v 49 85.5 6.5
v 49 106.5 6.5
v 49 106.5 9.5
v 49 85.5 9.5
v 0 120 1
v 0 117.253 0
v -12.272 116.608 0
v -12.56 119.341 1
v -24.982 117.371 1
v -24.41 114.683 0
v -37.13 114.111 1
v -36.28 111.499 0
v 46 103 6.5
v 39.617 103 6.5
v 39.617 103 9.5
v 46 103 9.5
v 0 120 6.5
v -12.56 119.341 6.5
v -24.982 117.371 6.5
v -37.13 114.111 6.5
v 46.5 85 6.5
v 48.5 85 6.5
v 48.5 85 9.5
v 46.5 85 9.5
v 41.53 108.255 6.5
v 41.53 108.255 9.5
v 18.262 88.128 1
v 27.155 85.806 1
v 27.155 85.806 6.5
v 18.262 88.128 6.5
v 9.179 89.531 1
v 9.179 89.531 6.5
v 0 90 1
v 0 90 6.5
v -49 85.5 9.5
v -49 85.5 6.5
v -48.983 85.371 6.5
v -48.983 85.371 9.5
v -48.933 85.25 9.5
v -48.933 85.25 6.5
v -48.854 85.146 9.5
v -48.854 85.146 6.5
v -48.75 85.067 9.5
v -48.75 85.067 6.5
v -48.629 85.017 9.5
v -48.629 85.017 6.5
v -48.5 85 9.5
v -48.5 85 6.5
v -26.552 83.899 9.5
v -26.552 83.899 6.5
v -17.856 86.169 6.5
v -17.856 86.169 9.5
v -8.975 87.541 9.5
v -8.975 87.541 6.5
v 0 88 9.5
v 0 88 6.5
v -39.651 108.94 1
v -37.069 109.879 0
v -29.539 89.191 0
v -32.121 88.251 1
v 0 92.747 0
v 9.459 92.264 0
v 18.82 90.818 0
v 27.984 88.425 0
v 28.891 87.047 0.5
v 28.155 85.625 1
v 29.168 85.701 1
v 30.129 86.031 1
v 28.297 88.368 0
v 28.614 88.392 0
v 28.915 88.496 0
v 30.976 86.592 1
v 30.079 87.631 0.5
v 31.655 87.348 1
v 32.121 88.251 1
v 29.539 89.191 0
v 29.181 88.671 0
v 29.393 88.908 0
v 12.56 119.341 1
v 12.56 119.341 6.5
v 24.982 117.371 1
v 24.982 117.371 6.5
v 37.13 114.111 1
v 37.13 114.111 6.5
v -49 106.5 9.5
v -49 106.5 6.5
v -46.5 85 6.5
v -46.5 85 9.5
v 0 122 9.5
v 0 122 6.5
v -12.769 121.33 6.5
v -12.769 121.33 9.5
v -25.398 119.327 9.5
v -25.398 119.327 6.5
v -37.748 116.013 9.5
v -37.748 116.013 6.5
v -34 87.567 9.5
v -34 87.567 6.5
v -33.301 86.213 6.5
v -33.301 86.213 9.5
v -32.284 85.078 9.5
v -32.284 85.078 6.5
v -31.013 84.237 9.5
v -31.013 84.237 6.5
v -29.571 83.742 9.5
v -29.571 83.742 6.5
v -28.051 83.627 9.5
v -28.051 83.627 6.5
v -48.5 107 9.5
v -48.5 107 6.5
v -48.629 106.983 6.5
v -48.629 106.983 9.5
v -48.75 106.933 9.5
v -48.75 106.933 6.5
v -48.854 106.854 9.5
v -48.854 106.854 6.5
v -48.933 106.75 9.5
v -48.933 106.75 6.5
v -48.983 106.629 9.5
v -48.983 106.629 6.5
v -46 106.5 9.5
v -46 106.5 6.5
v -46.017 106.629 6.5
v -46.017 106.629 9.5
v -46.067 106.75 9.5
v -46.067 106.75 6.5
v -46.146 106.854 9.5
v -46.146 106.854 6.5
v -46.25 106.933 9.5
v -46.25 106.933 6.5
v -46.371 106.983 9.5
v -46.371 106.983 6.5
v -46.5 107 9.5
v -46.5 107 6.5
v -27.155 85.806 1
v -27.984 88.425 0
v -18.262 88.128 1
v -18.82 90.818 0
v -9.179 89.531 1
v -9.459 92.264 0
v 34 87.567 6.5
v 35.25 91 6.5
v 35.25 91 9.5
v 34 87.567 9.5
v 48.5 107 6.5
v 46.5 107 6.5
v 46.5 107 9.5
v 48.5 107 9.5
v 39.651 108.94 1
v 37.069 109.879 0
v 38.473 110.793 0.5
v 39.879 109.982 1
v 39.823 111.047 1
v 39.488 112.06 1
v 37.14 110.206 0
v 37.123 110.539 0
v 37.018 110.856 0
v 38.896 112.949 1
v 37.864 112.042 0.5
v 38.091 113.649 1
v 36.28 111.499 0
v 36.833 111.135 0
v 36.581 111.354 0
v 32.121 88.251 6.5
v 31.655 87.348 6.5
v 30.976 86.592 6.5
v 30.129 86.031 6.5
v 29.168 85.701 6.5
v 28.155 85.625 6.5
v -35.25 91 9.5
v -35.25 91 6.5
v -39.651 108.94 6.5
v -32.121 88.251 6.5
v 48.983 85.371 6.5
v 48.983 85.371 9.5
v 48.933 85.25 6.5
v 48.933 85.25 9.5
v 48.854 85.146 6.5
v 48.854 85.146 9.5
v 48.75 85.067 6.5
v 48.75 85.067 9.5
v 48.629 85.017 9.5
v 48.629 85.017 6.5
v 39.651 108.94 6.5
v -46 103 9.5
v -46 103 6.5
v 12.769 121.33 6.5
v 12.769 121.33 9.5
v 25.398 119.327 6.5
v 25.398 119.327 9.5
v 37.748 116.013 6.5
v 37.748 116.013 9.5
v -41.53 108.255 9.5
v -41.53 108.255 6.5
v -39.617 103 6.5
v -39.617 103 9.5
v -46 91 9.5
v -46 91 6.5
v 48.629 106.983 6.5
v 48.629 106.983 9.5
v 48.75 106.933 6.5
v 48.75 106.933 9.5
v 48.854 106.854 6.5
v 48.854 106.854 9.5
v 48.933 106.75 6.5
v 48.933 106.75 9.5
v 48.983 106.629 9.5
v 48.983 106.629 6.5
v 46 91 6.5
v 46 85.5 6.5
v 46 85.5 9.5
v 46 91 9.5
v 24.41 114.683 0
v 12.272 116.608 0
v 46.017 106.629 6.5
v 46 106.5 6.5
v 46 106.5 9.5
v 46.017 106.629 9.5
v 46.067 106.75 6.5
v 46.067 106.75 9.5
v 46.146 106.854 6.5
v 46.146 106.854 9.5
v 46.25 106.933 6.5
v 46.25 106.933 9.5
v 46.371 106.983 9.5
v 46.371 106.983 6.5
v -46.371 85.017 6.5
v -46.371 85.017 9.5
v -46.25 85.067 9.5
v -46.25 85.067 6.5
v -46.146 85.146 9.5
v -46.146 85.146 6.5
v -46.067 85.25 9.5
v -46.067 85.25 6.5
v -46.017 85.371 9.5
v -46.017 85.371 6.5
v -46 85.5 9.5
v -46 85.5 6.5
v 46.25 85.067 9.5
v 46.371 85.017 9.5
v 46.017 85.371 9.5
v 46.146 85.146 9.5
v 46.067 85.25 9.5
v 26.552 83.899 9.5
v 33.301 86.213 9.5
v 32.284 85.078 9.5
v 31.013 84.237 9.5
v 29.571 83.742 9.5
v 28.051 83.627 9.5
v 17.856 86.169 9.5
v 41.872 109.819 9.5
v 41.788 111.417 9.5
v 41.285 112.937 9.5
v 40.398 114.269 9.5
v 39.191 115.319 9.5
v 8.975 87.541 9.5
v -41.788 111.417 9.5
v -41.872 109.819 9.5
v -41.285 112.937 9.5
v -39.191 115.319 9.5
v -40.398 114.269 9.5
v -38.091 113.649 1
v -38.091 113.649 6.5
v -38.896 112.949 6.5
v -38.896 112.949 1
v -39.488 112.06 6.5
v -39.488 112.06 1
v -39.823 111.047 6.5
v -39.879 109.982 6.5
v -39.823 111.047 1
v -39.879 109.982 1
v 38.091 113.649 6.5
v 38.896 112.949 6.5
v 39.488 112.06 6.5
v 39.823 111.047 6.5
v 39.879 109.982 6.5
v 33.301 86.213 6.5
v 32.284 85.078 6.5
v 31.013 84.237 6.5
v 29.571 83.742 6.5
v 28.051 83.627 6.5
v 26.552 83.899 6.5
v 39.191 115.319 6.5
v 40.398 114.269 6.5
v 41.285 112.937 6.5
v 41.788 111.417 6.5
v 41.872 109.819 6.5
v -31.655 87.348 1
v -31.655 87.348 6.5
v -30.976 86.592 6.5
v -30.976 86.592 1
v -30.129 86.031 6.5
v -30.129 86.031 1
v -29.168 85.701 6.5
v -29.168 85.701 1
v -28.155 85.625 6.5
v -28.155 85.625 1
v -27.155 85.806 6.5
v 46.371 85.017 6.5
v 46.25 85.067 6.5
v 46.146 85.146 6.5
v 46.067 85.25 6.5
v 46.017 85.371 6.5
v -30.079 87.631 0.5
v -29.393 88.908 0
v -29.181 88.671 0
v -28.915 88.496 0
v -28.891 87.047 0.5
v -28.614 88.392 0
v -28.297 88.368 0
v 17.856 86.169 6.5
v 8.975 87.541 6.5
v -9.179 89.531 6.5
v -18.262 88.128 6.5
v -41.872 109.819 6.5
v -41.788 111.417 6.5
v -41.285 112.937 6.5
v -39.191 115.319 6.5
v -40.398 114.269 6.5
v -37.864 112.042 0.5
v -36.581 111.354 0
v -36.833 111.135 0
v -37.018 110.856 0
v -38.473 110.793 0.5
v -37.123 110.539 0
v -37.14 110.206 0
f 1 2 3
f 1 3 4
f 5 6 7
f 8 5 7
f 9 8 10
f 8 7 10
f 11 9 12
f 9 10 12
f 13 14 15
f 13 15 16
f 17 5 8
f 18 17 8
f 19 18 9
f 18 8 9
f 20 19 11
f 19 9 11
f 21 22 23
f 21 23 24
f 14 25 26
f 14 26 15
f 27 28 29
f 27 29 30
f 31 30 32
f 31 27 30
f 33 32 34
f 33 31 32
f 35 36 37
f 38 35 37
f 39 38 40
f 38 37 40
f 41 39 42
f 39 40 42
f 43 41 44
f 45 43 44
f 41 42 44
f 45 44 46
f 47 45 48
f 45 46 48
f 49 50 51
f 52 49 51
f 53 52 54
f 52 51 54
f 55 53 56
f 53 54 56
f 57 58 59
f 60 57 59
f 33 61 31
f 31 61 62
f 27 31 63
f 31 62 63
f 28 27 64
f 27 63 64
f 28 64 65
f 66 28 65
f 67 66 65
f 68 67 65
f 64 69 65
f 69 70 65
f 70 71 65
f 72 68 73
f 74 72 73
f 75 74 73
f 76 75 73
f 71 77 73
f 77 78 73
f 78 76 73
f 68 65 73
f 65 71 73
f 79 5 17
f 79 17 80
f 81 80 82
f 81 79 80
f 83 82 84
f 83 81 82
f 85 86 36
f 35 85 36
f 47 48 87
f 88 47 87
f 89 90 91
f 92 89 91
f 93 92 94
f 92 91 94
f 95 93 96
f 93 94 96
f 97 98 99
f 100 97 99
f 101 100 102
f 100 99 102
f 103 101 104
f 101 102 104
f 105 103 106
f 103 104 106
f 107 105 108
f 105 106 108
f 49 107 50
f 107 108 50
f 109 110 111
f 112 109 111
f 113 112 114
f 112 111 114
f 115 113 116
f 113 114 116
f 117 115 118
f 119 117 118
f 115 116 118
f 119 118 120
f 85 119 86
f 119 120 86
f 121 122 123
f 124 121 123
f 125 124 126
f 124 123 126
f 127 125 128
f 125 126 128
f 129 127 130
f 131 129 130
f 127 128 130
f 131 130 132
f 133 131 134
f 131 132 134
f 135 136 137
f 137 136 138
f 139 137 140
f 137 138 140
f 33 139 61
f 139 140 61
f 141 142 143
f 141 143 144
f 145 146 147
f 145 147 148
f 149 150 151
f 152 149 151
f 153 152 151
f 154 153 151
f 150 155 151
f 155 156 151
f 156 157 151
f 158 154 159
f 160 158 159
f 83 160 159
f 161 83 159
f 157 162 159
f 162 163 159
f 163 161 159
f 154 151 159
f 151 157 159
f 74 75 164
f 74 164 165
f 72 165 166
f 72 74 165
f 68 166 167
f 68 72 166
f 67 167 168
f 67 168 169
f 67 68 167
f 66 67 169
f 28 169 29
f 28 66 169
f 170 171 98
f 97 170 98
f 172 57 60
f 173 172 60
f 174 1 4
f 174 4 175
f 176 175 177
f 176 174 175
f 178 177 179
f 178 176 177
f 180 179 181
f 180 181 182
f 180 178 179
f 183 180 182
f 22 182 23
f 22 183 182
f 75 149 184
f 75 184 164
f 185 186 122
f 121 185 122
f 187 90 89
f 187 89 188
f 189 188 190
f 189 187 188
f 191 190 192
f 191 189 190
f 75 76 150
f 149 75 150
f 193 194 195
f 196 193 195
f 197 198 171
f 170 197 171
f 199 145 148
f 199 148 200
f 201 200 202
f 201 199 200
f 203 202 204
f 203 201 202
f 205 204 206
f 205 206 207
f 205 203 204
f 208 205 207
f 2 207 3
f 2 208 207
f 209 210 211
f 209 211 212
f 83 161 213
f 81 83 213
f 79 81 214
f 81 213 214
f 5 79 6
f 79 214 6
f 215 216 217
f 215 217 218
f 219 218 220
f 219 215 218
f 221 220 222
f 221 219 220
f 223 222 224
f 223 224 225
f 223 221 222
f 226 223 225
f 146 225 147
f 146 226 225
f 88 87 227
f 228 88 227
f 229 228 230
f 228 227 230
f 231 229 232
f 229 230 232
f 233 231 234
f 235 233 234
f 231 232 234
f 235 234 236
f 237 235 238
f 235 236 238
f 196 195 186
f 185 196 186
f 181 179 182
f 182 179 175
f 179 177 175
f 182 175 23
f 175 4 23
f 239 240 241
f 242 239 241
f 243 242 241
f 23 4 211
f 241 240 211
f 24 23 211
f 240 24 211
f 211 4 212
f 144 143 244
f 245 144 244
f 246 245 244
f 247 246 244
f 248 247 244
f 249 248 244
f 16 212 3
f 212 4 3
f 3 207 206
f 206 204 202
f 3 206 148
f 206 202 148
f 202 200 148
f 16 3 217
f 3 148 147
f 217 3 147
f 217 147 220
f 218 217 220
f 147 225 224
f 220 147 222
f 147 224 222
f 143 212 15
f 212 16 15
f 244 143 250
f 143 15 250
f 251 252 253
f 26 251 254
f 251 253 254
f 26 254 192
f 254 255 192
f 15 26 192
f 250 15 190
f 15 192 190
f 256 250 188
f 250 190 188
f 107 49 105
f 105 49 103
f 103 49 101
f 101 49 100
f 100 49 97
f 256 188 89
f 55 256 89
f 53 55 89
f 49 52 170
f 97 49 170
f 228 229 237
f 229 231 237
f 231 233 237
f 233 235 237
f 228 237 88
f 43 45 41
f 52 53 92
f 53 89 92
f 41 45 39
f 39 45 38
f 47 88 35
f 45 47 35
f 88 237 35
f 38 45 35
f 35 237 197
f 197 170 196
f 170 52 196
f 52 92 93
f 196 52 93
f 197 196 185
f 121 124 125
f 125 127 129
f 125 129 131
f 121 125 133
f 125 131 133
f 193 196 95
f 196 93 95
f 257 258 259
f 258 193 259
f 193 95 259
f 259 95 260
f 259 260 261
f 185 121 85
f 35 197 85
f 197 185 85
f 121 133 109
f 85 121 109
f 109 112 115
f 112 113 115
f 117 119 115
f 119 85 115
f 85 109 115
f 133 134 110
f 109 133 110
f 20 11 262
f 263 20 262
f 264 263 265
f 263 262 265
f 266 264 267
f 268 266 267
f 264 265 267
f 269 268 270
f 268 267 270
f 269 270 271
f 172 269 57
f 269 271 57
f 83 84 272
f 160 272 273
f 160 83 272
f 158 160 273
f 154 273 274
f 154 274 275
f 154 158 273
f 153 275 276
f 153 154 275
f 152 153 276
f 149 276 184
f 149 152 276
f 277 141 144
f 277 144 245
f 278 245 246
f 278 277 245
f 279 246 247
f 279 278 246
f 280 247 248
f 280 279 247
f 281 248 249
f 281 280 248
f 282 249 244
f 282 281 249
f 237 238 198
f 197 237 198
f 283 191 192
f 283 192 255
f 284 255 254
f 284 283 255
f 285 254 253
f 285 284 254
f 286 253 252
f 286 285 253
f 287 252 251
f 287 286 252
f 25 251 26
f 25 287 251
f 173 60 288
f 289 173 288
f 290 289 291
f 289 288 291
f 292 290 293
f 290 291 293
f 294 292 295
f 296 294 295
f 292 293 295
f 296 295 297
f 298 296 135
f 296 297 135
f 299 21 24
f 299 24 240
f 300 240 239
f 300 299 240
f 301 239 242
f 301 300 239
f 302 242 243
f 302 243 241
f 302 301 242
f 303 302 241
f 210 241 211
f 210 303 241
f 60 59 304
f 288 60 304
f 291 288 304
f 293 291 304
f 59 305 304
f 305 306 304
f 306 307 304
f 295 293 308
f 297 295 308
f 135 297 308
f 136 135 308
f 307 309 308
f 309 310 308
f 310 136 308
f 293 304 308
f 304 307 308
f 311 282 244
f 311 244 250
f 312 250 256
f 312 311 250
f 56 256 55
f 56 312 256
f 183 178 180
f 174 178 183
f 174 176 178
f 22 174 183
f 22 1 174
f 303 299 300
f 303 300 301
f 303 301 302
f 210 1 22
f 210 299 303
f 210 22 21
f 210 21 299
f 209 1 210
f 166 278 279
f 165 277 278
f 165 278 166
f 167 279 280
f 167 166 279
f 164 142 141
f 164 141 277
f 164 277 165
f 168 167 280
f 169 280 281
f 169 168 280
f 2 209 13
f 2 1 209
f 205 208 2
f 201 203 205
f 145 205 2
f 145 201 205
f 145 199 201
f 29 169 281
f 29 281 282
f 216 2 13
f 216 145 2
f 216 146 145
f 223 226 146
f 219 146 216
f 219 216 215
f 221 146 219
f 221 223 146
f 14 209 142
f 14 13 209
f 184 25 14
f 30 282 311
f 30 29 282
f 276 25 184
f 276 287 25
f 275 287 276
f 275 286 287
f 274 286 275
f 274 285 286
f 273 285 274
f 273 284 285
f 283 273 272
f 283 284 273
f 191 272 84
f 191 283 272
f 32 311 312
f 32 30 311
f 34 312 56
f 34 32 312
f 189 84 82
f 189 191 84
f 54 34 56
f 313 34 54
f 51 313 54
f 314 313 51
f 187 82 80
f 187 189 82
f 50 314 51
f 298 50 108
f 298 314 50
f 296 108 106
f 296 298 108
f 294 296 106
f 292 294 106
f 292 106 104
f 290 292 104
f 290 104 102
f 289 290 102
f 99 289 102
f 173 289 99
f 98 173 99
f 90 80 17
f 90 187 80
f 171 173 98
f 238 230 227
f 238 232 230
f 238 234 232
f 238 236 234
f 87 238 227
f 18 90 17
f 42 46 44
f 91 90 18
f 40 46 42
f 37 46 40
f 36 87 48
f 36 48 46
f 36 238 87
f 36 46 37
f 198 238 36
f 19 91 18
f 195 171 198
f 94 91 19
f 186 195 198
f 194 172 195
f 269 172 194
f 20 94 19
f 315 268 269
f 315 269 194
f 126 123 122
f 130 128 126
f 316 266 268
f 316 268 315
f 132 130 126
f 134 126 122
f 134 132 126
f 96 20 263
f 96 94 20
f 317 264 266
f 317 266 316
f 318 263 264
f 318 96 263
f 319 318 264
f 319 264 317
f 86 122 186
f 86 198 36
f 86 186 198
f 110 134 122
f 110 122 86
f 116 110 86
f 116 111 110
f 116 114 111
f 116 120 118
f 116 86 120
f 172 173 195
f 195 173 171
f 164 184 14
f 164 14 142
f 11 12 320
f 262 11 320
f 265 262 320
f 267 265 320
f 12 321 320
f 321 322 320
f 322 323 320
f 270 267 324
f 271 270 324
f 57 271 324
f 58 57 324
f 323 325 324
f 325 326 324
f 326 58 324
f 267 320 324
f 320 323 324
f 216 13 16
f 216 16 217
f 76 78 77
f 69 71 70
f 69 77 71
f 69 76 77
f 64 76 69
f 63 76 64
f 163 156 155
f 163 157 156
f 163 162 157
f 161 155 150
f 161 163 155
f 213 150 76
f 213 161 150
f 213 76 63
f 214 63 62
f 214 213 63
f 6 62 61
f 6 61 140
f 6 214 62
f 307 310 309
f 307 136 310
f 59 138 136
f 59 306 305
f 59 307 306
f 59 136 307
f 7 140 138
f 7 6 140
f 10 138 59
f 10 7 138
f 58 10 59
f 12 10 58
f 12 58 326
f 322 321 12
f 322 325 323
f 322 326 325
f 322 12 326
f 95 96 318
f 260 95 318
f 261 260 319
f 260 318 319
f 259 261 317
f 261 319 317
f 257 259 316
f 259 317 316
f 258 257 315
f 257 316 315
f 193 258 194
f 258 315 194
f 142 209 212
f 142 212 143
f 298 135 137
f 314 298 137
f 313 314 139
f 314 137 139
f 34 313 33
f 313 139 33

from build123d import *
from OCP.BRepFilletAPI import BRepFilletAPI_MakeChamfer

# Parameters (mm, degrees)
DODANIE_WYCI_GNI_CIE1_DEPTH = 6.5
DODANIE_WYCI_GNI_CIE2_DEPTH = 3
SFAZOWANIE1_SIZE            = 1
SFAZOWANIE1_SIZE2           = 2.747477419


with BuildPart() as part:
    # Szkic2 → Dodanie-wyciągnięcie1 (new body)
    with BuildSketch(Plane.XY):
        with BuildLine():
            Line((-39.650742014, 108.939518347), (-32.120772186, 88.251096277))
            ThreePointArc((-32.120772186, 88.251096277), (-30.12924195, 86.030742386), (-27.155108014, 85.805594857))
            ThreePointArc((-27.155108014, 85.805594857), (-13.738567299, 88.945217795), (0, 90))
            Line((0, 90), (0, 120))
            ThreePointArc((0, 120), (-18.796846712, 118.518684408), (-37.129625721, 114.111309228))
            ThreePointArc((-37.129625721, 114.111309228), (-39.48751323, 112.060333895), (-39.650742014, 108.939518347))
        make_face()
    dodanie_wyci_gni_cie1 = extrude(amount=DODANIE_WYCI_GNI_CIE1_DEPTH)

    # Szkic3 → Dodanie-wyciągnięcie2 (add)
    with BuildSketch(Plane.XY.offset(6.5)):
        with BuildLine():
            Line((-46, 91), (-35.249646863, 91))
            Line((-35.249646863, 91), (-34.000157428, 87.567055991))
            ThreePointArc((-34.000157428, 87.567055991), (-31.012862074, 84.236525153), (-26.551661169, 83.89880386))
            ThreePointArc((-26.551661169, 83.89880386), (-13.433265804, 86.968657399), (0, 88))
            Line((0, 88), (0, 90))
            ThreePointArc((0, 90), (-13.738567299, 88.945217795), (-27.155108014, 85.805594857))
            ThreePointArc((-27.155108014, 85.805594857), (-30.12924195, 86.030742386), (-32.120772186, 88.251096277))
            Line((-32.120772186, 88.251096277), (-39.650742014, 108.939518347))
            ThreePointArc((-39.650742014, 108.939518347), (-39.48751323, 112.060333895), (-37.129625721, 114.111309228))
            ThreePointArc((-37.129625721, 114.111309228), (-18.796846712, 118.518684408), (0, 120))
            Line((0, 120), (0, 122))
            ThreePointArc((0, 122), (-19.11012749, 120.493995814), (-37.748452817, 116.013164382))
            ThreePointArc((-37.748452817, 116.013164382), (-41.285284079, 112.936701382), (-41.530127255, 108.255478061))
            Line((-41.530127255, 108.255478061), (-39.617289674, 103))
            Line((-39.617289674, 103), (-46, 103))
            Line((-46, 103), (-46, 106.5))
            ThreePointArc((-46, 106.5), (-46.146446609, 106.853553391), (-46.5, 107))
            Line((-46.5, 107), (-48.5, 107))
            ThreePointArc((-48.5, 107), (-48.853553391, 106.853553391), (-49, 106.5))
            Line((-49, 106.5), (-49, 103))
            Line((-49, 103), (-49, 85.5))
            ThreePointArc((-49, 85.5), (-48.853553391, 85.146446609), (-48.5, 85))
            Line((-48.5, 85), (-46.5, 85))
            ThreePointArc((-46.5, 85), (-46.146446609, 85.146446609), (-46, 85.5))
            Line((-46, 85.5), (-46, 91))
        make_face()
        with BuildLine():
            ThreePointArc((-27.155108014, 85.805594857), (-13.738567299, 88.945217795), (0, 90))
            Line((0, 90), (0, 120))
            ThreePointArc((0, 120), (-18.796846712, 118.518684408), (-37.129625721, 114.111309228))
            ThreePointArc((-37.129625721, 114.111309228), (-39.48751323, 112.060333895), (-39.650742014, 108.939518347))
            Line((-39.650742014, 108.939518347), (-32.120772186, 88.251096277))
            ThreePointArc((-32.120772186, 88.251096277), (-30.12924195, 86.030742386), (-27.155108014, 85.805594857))
        make_face()
    dodanie_wyci_gni_cie2 = extrude(amount=DODANIE_WYCI_GNI_CIE2_DEPTH)

    # Lustro1: Dodanie-wyciągnięcie1, Dodanie-wyciągnięcie2 across plane
    add(dodanie_wyci_gni_cie1.mirror(Plane(origin=(0, 0, 0), x_dir=(0, 0, 1), z_dir=(1, 0, 0))))
    add(dodanie_wyci_gni_cie2.mirror(Plane(origin=(0, 0, 0), x_dir=(0, 0, 1), z_dir=(1, 0, 0))))

    # Sfazowanie1: one chamfer whose edges measure the first distance from different faces: ONE call of the kernel's chamfer builder (chamfer() names one face for all edges)
    sfazowanie1_edges_1 = [part.edges().sort_by_distance(p)[0] for p in [
        (-39.48751323, 112.060333895, 0),
    ]]
    sfazowanie1_side_1 = [part.faces().sort_by_distance(p)[0] for p in [
        (-39.48751323, 112.060333895, 3.25),
    ]]
    sfazowanie1_edges_2 = [part.edges().sort_by_distance(p)[0] for p in [
        (0, 120, 0),
    ]]
    sfazowanie1_side_2 = [part.faces().sort_by_distance(p)[0] for p in [
        (0, 120, 3.25),
    ]]
    sfazowanie1_edges_3 = [part.edges().sort_by_distance(p)[0] for p in [
        (30.12924195, 86.030742386, 0),
    ]]
    sfazowanie1_side_3 = [part.faces().sort_by_distance(p)[0] for p in [
        (30.12924195, 86.030742386, 3.25),
    ]]
    sfazowanie1_edges_4 = [part.edges().sort_by_distance(p)[0] for p in [
        (35.8857571, 98.595307312, 0),
    ]]
    sfazowanie1_side_4 = [part.faces().sort_by_distance(p)[0] for p in [
        (35.8857571, 98.595307312, 3.25),
    ]]
    sfazowanie1_edges_5 = [part.edges().sort_by_distance(p)[0] for p in [
        (39.48751323, 112.060333895, 0),
    ]]
    sfazowanie1_side_5 = [part.faces().sort_by_distance(p)[0] for p in [
        (39.48751323, 112.060333895, 3.25),
    ]]
    sfazowanie1_edges_6 = [part.edges().sort_by_distance(p)[0] for p in [
        (0, 90, 0),
    ]]
    sfazowanie1_side_6 = [part.faces().sort_by_distance(p)[0] for p in [
        (0, 90, 3.25),
    ]]
    sfazowanie1_edges_7 = [part.edges().sort_by_distance(p)[0] for p in [
        (-30.12924195, 86.030742386, 0),
    ]]
    sfazowanie1_side_7 = [part.faces().sort_by_distance(p)[0] for p in [
        (-30.12924195, 86.030742386, 3.25),
    ]]
    sfazowanie1_edges_8 = [part.edges().sort_by_distance(p)[0] for p in [
        (-35.8857571, 98.595307312, 0),
    ]]
    sfazowanie1_side_8 = [part.faces().sort_by_distance(p)[0] for p in [
        (-35.8857571, 98.595307312, 3.25),
    ]]
    sfazowanie1 = BRepFilletAPI_MakeChamfer(part.part.solid().wrapped)
    for e in sfazowanie1_edges_1:
        sfazowanie1.Add(SFAZOWANIE1_SIZE, SFAZOWANIE1_SIZE2, e.wrapped, sfazowanie1_side_1[0].wrapped)  # the first distance lies on this face
    for e in sfazowanie1_edges_2:
        sfazowanie1.Add(SFAZOWANIE1_SIZE, SFAZOWANIE1_SIZE2, e.wrapped, sfazowanie1_side_2[0].wrapped)  # the first distance lies on this face
    for e in sfazowanie1_edges_3:
        sfazowanie1.Add(SFAZOWANIE1_SIZE, SFAZOWANIE1_SIZE2, e.wrapped, sfazowanie1_side_3[0].wrapped)  # the first distance lies on this face
    for e in sfazowanie1_edges_4:
        sfazowanie1.Add(SFAZOWANIE1_SIZE, SFAZOWANIE1_SIZE2, e.wrapped, sfazowanie1_side_4[0].wrapped)  # the first distance lies on this face
    for e in sfazowanie1_edges_5:
        sfazowanie1.Add(SFAZOWANIE1_SIZE, SFAZOWANIE1_SIZE2, e.wrapped, sfazowanie1_side_5[0].wrapped)  # the first distance lies on this face
    for e in sfazowanie1_edges_6:
        sfazowanie1.Add(SFAZOWANIE1_SIZE, SFAZOWANIE1_SIZE2, e.wrapped, sfazowanie1_side_6[0].wrapped)  # the first distance lies on this face
    for e in sfazowanie1_edges_7:
        sfazowanie1.Add(SFAZOWANIE1_SIZE, SFAZOWANIE1_SIZE2, e.wrapped, sfazowanie1_side_7[0].wrapped)  # the first distance lies on this face
    for e in sfazowanie1_edges_8:
        sfazowanie1.Add(SFAZOWANIE1_SIZE, SFAZOWANIE1_SIZE2, e.wrapped, sfazowanie1_side_8[0].wrapped)  # the first distance lies on this face
    add(Compound.cast(sfazowanie1.Shape()), mode=Mode.REPLACE)


solid = part.part
